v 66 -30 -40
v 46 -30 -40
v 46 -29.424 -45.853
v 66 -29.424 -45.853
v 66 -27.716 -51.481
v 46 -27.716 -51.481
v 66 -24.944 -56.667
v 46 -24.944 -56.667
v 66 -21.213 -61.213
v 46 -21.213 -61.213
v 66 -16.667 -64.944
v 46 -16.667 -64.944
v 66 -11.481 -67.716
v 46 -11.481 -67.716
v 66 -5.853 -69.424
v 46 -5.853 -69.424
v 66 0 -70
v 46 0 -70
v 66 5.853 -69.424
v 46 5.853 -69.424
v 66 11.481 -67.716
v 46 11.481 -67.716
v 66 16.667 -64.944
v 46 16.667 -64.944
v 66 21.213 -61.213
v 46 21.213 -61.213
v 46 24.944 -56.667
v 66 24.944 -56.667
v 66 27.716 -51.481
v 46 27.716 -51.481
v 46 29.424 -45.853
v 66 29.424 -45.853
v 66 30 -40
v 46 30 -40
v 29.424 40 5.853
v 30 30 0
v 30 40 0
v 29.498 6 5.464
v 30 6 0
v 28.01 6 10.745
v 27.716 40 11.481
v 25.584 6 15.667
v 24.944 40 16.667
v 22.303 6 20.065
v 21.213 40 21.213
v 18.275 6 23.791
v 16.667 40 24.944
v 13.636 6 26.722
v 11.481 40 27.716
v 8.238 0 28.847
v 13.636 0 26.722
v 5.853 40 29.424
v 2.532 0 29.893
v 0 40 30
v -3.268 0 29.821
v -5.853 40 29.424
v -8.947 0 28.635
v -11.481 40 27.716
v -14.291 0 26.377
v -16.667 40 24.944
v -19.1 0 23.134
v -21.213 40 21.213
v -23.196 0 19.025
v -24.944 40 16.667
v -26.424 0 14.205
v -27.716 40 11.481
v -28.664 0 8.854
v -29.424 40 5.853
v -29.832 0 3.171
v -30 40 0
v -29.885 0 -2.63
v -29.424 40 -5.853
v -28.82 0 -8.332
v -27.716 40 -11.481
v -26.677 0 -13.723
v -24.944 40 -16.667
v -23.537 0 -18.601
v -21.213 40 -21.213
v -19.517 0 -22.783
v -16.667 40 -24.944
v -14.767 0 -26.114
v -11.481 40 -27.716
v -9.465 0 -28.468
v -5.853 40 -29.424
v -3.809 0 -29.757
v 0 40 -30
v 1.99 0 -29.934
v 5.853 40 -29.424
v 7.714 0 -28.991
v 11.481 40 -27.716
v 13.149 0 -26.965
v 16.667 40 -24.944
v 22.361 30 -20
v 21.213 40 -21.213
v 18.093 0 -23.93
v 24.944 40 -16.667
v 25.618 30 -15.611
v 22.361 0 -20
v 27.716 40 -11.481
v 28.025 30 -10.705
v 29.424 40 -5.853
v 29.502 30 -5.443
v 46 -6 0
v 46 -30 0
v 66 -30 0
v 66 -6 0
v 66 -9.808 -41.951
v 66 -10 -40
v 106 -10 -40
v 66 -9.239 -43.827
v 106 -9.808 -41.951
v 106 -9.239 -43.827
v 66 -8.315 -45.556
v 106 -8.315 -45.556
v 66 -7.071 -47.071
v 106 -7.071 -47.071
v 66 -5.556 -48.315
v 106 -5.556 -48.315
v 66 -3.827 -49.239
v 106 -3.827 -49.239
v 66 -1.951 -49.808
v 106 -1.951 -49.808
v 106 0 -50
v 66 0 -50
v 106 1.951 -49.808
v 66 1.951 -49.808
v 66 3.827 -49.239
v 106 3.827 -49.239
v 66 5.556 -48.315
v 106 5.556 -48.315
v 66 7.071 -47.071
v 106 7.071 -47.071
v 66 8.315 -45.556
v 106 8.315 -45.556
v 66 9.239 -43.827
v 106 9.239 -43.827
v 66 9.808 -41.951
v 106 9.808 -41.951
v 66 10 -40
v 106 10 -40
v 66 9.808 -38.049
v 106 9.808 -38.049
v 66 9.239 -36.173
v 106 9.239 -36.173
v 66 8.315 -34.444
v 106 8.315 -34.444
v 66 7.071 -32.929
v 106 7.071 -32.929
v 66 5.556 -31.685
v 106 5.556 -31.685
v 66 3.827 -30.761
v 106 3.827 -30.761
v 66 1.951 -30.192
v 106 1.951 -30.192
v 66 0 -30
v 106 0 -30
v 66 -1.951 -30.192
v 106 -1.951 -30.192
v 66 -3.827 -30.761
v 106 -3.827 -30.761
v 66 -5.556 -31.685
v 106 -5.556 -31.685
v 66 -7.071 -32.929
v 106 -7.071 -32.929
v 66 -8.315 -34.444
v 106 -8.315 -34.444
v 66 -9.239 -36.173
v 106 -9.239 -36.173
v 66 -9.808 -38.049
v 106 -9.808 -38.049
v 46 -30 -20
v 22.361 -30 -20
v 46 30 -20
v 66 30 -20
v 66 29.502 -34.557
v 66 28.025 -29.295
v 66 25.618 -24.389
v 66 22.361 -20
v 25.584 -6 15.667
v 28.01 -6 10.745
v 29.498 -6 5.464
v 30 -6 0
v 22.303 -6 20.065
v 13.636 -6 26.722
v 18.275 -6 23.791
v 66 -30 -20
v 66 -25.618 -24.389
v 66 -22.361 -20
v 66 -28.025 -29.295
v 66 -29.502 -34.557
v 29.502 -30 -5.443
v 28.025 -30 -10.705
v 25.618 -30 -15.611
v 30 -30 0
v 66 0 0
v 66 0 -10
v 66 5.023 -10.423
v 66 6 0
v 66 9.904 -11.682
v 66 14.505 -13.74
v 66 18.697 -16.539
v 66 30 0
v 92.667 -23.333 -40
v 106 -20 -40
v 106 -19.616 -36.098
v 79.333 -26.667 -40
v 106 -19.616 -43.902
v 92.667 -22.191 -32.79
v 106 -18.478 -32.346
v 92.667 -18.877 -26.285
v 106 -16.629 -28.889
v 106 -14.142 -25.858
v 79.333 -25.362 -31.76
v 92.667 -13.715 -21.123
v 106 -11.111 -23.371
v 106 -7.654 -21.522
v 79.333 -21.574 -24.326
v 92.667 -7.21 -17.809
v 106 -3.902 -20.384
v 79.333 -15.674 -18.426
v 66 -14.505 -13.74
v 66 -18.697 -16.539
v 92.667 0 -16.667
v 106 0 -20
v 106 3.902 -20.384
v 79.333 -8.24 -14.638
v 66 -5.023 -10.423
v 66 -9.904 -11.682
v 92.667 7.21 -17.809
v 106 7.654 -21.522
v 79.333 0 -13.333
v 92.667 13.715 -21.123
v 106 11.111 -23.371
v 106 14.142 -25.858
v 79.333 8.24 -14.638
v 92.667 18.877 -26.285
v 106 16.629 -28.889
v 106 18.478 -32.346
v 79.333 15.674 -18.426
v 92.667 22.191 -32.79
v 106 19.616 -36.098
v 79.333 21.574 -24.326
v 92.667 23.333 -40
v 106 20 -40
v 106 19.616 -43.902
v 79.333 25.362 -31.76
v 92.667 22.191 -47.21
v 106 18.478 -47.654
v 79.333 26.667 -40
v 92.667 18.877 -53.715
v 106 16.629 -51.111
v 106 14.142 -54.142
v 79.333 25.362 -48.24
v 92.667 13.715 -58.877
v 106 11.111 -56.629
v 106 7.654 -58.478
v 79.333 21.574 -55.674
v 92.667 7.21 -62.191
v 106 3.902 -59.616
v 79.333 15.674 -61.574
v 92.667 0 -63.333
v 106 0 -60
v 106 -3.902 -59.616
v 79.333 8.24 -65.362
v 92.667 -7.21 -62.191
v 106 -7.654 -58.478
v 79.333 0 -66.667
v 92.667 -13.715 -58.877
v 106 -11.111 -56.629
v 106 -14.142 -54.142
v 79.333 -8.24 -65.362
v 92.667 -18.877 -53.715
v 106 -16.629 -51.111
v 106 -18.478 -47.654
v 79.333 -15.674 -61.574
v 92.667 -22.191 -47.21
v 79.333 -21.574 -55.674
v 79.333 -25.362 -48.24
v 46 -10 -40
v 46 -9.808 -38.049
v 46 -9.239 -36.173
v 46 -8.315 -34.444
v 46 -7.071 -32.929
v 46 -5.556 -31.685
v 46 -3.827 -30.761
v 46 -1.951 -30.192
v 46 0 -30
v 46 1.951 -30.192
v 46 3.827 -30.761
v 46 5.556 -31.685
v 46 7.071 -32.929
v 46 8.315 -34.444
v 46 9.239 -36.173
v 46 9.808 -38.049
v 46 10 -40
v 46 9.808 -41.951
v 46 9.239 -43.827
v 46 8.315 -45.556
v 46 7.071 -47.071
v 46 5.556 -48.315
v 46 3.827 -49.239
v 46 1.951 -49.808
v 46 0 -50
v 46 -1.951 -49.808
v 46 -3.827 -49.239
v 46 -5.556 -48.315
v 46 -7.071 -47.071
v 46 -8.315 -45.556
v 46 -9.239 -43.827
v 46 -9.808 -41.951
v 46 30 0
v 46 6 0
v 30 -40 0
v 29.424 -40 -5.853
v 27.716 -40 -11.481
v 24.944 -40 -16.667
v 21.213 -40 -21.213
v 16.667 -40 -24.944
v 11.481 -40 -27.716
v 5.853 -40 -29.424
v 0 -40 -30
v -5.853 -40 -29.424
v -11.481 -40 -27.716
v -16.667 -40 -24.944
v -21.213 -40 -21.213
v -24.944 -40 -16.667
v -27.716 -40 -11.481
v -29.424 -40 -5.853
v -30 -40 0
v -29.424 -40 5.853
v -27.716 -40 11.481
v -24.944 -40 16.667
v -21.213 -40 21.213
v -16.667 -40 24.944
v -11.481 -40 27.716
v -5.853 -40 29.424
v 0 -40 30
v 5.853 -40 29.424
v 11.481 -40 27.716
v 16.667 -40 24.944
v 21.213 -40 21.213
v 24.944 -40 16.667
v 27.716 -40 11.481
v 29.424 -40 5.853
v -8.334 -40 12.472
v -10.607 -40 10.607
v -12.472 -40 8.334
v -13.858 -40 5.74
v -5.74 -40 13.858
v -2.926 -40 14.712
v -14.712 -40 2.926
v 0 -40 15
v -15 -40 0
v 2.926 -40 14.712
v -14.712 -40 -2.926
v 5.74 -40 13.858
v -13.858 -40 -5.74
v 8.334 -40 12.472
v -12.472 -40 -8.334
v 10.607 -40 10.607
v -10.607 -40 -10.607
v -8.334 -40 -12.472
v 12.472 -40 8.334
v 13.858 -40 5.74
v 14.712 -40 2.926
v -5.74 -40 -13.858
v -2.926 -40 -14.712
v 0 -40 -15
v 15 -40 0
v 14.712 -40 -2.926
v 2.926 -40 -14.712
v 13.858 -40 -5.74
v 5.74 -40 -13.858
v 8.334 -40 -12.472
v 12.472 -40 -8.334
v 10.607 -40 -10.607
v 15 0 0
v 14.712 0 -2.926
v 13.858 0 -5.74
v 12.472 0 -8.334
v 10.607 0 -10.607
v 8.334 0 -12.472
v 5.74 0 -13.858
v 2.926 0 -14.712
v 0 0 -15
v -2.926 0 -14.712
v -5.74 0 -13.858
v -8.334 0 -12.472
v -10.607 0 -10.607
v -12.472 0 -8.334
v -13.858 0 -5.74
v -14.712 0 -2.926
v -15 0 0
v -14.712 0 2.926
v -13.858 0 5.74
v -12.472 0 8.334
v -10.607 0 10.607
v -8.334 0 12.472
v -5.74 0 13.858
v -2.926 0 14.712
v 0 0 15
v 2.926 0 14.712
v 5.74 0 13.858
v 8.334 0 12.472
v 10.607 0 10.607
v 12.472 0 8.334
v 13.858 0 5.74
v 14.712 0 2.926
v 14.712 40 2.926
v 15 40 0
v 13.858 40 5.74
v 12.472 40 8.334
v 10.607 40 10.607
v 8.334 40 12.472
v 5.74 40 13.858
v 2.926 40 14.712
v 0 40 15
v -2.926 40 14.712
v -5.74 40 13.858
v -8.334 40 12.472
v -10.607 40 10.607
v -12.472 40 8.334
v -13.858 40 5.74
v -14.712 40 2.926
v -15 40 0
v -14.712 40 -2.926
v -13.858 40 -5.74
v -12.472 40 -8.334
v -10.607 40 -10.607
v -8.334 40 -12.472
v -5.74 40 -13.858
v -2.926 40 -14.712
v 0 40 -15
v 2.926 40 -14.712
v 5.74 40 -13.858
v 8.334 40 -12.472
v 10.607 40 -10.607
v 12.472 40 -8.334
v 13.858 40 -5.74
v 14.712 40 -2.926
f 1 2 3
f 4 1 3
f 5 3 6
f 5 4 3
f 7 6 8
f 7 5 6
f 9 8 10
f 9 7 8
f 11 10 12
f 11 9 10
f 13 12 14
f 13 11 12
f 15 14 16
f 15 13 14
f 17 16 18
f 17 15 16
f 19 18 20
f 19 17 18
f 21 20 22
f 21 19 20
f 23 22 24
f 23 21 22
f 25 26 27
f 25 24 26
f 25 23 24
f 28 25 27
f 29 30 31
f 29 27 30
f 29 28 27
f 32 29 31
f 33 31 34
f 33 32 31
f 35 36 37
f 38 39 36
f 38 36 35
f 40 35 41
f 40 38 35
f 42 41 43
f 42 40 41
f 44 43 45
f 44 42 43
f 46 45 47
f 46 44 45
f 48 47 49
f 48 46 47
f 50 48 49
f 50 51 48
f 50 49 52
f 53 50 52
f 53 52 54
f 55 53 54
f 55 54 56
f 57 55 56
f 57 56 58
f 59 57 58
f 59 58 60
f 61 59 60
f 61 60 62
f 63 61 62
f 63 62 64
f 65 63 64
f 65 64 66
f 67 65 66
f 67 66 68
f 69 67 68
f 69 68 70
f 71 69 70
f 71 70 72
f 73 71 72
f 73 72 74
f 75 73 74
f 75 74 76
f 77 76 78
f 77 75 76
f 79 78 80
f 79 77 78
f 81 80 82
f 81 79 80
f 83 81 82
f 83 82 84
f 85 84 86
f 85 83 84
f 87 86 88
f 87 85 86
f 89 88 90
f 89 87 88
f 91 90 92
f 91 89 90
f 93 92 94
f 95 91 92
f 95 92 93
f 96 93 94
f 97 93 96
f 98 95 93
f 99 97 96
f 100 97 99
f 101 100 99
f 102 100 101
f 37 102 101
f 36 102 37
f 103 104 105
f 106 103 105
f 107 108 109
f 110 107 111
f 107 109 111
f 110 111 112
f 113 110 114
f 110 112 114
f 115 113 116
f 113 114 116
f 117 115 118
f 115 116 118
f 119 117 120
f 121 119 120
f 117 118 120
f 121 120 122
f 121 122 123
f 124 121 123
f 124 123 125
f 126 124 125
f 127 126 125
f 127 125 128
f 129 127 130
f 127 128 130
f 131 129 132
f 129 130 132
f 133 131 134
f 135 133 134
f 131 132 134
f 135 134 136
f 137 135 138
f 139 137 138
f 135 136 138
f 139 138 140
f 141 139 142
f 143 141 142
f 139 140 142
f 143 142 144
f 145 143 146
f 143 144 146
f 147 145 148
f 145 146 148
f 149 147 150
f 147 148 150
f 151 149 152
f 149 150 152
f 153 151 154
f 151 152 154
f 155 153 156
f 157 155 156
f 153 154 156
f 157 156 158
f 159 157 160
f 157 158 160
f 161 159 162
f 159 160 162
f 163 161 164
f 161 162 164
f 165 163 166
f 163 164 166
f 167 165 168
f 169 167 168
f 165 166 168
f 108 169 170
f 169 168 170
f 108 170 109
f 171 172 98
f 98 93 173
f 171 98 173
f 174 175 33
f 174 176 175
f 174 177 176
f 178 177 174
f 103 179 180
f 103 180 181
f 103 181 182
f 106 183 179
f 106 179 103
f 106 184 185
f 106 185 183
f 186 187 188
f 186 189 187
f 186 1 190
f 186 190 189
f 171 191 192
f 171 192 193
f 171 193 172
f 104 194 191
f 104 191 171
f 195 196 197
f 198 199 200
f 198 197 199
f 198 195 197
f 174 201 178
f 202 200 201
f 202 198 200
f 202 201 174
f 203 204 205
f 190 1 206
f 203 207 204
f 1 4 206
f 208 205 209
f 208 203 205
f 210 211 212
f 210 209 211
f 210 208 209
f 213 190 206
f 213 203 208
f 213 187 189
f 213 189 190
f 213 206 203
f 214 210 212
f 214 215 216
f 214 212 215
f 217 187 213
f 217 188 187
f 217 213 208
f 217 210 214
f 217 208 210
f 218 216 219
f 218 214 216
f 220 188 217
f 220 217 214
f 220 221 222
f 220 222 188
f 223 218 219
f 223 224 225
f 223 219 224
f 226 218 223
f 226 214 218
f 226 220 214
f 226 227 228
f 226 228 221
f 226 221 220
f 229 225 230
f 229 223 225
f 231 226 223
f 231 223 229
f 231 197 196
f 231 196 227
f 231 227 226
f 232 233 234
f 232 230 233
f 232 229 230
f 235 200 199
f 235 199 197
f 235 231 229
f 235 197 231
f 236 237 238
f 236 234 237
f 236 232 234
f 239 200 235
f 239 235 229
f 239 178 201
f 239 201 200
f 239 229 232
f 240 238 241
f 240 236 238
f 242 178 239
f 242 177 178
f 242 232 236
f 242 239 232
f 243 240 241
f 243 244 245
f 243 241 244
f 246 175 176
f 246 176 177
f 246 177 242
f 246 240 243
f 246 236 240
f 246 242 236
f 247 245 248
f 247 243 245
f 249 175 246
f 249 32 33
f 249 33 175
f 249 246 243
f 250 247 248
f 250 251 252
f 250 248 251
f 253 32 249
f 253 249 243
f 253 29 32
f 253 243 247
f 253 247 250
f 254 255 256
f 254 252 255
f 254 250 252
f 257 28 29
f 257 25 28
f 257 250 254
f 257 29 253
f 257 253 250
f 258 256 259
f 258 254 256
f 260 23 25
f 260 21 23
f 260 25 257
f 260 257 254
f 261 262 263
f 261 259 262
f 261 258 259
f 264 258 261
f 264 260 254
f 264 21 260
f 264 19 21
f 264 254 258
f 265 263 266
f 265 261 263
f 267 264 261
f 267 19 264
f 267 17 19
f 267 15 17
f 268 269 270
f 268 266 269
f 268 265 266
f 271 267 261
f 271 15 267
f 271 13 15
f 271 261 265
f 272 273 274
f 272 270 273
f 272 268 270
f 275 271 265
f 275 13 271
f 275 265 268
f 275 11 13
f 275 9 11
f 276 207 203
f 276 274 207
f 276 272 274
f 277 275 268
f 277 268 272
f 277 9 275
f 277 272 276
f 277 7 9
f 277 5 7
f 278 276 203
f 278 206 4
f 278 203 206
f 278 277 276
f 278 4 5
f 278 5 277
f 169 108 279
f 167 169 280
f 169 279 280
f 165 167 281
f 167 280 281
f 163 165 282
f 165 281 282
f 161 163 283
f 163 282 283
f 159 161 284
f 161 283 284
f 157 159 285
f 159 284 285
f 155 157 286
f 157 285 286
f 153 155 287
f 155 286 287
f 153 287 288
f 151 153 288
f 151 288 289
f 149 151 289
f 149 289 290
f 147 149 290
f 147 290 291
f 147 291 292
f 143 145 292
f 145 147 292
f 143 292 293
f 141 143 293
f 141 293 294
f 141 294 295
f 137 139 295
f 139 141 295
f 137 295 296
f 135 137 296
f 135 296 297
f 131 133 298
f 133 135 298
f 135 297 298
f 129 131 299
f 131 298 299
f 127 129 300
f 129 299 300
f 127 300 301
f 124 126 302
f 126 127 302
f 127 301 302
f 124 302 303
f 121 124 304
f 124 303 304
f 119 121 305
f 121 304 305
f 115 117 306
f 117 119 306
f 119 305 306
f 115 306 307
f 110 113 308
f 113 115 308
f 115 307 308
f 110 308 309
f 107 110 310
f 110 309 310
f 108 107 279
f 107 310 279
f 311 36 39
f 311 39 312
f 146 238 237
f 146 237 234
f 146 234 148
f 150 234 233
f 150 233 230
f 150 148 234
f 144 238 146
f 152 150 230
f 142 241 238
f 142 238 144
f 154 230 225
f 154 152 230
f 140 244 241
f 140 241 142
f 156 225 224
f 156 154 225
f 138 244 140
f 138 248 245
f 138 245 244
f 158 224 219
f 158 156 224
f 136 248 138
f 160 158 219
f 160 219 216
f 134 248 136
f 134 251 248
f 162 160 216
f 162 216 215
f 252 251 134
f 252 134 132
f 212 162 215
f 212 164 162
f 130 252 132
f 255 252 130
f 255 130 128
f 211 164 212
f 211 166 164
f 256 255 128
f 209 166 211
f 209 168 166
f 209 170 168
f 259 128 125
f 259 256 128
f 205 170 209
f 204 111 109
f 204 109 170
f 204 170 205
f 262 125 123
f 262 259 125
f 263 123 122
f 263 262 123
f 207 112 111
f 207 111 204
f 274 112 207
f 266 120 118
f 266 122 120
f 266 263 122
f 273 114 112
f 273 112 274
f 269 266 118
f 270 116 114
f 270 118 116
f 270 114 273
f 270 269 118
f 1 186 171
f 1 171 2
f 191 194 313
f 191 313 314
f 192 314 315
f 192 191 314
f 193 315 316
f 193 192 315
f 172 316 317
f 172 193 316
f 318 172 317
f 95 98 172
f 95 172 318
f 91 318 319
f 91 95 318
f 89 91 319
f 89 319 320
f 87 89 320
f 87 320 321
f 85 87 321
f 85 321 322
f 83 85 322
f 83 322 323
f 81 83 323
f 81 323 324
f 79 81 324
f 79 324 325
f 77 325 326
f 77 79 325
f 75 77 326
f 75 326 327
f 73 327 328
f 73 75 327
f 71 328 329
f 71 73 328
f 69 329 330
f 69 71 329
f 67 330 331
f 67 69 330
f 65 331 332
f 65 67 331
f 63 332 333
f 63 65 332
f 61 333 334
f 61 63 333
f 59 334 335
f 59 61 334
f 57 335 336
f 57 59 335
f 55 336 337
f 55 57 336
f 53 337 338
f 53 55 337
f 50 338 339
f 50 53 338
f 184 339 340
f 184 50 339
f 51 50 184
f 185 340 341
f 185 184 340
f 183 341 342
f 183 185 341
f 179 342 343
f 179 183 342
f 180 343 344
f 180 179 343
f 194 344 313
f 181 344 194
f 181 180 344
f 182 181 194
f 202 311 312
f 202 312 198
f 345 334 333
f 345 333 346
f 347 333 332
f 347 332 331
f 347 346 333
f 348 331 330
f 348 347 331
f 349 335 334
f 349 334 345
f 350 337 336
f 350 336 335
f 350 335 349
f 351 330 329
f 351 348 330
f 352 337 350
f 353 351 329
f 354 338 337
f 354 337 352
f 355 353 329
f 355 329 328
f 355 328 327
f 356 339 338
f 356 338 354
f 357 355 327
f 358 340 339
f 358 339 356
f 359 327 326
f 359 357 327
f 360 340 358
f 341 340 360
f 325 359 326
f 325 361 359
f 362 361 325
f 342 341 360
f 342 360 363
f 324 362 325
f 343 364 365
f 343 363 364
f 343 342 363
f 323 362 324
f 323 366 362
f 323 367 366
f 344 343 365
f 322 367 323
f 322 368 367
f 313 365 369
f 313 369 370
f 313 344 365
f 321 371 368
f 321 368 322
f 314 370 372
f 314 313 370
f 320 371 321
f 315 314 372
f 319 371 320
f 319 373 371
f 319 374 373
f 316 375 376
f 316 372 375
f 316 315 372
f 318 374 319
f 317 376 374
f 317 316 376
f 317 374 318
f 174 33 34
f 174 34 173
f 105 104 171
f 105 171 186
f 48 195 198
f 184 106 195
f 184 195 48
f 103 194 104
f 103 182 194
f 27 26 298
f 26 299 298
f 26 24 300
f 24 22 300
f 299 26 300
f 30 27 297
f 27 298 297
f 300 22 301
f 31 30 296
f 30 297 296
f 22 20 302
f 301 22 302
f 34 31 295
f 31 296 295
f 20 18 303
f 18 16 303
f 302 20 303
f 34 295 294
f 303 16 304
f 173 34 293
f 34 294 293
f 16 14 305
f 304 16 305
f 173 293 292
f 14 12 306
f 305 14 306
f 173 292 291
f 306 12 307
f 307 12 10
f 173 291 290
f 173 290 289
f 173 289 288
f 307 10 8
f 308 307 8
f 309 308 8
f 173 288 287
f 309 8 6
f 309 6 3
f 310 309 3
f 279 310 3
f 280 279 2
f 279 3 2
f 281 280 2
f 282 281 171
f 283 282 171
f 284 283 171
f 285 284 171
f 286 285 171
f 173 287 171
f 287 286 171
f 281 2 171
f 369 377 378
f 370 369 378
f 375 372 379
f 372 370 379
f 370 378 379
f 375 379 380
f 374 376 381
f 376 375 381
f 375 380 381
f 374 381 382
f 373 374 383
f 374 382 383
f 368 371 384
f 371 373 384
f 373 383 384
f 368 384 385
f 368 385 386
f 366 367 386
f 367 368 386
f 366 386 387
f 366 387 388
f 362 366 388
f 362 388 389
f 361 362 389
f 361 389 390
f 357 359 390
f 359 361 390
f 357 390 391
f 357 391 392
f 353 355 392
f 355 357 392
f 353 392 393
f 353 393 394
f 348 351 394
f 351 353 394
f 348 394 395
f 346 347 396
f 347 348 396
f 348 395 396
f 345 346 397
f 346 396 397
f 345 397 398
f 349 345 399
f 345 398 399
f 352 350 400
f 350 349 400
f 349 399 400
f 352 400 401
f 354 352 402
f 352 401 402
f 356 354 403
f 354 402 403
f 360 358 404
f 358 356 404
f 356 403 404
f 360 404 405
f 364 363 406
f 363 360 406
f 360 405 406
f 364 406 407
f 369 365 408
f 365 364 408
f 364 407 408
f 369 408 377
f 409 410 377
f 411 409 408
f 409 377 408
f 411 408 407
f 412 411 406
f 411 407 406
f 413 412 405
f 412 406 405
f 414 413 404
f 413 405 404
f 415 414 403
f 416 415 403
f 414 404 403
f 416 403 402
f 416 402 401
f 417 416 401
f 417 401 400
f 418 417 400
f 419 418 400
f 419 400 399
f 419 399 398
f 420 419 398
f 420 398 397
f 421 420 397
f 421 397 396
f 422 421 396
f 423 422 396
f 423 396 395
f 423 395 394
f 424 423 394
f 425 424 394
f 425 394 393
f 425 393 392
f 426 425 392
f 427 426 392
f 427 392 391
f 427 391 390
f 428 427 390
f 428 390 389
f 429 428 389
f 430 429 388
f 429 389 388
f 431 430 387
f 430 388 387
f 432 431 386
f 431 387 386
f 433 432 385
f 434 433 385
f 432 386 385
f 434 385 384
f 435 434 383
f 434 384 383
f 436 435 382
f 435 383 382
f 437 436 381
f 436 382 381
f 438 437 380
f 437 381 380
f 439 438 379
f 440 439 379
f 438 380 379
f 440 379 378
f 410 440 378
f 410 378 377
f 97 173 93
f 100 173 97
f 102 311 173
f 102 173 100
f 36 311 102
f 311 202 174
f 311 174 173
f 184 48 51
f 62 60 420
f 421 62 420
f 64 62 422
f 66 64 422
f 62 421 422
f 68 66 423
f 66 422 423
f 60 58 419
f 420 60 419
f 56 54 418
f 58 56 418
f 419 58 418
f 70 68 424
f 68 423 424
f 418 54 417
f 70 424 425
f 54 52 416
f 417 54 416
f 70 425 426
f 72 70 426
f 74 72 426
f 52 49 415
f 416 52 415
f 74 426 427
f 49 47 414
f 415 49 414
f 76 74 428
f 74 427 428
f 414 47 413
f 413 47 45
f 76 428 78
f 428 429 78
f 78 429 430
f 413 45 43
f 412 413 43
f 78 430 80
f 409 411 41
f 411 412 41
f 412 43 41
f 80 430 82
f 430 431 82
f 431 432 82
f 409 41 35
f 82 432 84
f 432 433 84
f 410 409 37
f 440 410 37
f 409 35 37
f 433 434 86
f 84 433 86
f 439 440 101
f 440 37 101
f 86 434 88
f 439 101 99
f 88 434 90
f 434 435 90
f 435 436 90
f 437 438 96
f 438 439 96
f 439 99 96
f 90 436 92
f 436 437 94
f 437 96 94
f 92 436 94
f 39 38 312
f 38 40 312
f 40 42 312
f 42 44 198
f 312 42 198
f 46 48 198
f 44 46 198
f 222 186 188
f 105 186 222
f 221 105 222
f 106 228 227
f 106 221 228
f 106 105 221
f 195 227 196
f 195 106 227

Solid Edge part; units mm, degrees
sketch "Sketch1" plane through (0, 0, 0) normal (0, -1, 0) x (1, 0, 0)
  circle A0 centre (0, 0) radius 30
  circle A1 centre (0, 0) radius 15
extrude "Protrusion1" add sketch "Sketch1" along normal mid plane 80
sketch "Sketch2" plane through (0, 0, 0) normal (0, 1, 0) x (-1, 0, 0)
  line L0 (-66, 0) -> (-13.6364, 26.7217)
  line L1 (-13.6364, 26.7217) -> (-30, 0)
  line L2 (-30, 0) -> (-66, 0)
extrude "ExtrudedProtrusion_2" add sketch "Sketch2" along normal mid plane 12
sketch "Sketch3" plane through (48, 0, 0) normal (0, 0, -1) x (0, 1, 0)
  line L0 (-30, -28.3201) -> (-30, 18)
  line L1 (-30, 18) -> (0, 18)
  line L2 (0, 18) -> (30, 18)
  line L3 (30, 18) -> (30, -28.3201)
  line L4 (30, -28.3201) -> (-30, -28.3201)
extrude "ExtrudedProtrusion_3" add sketch "Sketch3" along normal blind 20
sketch "Sketch4" plane through (66, 0, -10) normal (1, 0, 0) x (0, 0, -1)
  line L0 (-10, -30) -> (30, -30)
  line L1 (-10, 30) -> (-10, -30)
  line L2 (30, 30) -> (-10, 30)
  arc A0 (30, 30) -> (30, -30) centre (30, 0) cw
extrude "ExtrudedProtrusion_4" add sketch "Sketch4" against normal blind 20
sketch "Sketch5" plane through (48, -18, -40) normal (0, 0, 1) x (0, -1, 0)
  line L0 (2, 58) -> (12, 18)
  line L1 (12, 18) -> (-8, 18)
  line L2 (-8, 18) -> (-8, 58)
  line L3 (-8, 58) -> (2, 58)
revolve "RevolvedProtrusion1" add sketch "Sketch5" angle 360 about axis through (66, 0, -40) along (1, 0, 0)
sketch "Sketch6" plane through (46, 0, -45) normal (-1, 0, 0) x (0, -1, 0)
  circle A0 centre (0, 5) radius 10
extrude "Cutout1" cut sketch "Sketch6" against normal up to vertex (60 mm away)
